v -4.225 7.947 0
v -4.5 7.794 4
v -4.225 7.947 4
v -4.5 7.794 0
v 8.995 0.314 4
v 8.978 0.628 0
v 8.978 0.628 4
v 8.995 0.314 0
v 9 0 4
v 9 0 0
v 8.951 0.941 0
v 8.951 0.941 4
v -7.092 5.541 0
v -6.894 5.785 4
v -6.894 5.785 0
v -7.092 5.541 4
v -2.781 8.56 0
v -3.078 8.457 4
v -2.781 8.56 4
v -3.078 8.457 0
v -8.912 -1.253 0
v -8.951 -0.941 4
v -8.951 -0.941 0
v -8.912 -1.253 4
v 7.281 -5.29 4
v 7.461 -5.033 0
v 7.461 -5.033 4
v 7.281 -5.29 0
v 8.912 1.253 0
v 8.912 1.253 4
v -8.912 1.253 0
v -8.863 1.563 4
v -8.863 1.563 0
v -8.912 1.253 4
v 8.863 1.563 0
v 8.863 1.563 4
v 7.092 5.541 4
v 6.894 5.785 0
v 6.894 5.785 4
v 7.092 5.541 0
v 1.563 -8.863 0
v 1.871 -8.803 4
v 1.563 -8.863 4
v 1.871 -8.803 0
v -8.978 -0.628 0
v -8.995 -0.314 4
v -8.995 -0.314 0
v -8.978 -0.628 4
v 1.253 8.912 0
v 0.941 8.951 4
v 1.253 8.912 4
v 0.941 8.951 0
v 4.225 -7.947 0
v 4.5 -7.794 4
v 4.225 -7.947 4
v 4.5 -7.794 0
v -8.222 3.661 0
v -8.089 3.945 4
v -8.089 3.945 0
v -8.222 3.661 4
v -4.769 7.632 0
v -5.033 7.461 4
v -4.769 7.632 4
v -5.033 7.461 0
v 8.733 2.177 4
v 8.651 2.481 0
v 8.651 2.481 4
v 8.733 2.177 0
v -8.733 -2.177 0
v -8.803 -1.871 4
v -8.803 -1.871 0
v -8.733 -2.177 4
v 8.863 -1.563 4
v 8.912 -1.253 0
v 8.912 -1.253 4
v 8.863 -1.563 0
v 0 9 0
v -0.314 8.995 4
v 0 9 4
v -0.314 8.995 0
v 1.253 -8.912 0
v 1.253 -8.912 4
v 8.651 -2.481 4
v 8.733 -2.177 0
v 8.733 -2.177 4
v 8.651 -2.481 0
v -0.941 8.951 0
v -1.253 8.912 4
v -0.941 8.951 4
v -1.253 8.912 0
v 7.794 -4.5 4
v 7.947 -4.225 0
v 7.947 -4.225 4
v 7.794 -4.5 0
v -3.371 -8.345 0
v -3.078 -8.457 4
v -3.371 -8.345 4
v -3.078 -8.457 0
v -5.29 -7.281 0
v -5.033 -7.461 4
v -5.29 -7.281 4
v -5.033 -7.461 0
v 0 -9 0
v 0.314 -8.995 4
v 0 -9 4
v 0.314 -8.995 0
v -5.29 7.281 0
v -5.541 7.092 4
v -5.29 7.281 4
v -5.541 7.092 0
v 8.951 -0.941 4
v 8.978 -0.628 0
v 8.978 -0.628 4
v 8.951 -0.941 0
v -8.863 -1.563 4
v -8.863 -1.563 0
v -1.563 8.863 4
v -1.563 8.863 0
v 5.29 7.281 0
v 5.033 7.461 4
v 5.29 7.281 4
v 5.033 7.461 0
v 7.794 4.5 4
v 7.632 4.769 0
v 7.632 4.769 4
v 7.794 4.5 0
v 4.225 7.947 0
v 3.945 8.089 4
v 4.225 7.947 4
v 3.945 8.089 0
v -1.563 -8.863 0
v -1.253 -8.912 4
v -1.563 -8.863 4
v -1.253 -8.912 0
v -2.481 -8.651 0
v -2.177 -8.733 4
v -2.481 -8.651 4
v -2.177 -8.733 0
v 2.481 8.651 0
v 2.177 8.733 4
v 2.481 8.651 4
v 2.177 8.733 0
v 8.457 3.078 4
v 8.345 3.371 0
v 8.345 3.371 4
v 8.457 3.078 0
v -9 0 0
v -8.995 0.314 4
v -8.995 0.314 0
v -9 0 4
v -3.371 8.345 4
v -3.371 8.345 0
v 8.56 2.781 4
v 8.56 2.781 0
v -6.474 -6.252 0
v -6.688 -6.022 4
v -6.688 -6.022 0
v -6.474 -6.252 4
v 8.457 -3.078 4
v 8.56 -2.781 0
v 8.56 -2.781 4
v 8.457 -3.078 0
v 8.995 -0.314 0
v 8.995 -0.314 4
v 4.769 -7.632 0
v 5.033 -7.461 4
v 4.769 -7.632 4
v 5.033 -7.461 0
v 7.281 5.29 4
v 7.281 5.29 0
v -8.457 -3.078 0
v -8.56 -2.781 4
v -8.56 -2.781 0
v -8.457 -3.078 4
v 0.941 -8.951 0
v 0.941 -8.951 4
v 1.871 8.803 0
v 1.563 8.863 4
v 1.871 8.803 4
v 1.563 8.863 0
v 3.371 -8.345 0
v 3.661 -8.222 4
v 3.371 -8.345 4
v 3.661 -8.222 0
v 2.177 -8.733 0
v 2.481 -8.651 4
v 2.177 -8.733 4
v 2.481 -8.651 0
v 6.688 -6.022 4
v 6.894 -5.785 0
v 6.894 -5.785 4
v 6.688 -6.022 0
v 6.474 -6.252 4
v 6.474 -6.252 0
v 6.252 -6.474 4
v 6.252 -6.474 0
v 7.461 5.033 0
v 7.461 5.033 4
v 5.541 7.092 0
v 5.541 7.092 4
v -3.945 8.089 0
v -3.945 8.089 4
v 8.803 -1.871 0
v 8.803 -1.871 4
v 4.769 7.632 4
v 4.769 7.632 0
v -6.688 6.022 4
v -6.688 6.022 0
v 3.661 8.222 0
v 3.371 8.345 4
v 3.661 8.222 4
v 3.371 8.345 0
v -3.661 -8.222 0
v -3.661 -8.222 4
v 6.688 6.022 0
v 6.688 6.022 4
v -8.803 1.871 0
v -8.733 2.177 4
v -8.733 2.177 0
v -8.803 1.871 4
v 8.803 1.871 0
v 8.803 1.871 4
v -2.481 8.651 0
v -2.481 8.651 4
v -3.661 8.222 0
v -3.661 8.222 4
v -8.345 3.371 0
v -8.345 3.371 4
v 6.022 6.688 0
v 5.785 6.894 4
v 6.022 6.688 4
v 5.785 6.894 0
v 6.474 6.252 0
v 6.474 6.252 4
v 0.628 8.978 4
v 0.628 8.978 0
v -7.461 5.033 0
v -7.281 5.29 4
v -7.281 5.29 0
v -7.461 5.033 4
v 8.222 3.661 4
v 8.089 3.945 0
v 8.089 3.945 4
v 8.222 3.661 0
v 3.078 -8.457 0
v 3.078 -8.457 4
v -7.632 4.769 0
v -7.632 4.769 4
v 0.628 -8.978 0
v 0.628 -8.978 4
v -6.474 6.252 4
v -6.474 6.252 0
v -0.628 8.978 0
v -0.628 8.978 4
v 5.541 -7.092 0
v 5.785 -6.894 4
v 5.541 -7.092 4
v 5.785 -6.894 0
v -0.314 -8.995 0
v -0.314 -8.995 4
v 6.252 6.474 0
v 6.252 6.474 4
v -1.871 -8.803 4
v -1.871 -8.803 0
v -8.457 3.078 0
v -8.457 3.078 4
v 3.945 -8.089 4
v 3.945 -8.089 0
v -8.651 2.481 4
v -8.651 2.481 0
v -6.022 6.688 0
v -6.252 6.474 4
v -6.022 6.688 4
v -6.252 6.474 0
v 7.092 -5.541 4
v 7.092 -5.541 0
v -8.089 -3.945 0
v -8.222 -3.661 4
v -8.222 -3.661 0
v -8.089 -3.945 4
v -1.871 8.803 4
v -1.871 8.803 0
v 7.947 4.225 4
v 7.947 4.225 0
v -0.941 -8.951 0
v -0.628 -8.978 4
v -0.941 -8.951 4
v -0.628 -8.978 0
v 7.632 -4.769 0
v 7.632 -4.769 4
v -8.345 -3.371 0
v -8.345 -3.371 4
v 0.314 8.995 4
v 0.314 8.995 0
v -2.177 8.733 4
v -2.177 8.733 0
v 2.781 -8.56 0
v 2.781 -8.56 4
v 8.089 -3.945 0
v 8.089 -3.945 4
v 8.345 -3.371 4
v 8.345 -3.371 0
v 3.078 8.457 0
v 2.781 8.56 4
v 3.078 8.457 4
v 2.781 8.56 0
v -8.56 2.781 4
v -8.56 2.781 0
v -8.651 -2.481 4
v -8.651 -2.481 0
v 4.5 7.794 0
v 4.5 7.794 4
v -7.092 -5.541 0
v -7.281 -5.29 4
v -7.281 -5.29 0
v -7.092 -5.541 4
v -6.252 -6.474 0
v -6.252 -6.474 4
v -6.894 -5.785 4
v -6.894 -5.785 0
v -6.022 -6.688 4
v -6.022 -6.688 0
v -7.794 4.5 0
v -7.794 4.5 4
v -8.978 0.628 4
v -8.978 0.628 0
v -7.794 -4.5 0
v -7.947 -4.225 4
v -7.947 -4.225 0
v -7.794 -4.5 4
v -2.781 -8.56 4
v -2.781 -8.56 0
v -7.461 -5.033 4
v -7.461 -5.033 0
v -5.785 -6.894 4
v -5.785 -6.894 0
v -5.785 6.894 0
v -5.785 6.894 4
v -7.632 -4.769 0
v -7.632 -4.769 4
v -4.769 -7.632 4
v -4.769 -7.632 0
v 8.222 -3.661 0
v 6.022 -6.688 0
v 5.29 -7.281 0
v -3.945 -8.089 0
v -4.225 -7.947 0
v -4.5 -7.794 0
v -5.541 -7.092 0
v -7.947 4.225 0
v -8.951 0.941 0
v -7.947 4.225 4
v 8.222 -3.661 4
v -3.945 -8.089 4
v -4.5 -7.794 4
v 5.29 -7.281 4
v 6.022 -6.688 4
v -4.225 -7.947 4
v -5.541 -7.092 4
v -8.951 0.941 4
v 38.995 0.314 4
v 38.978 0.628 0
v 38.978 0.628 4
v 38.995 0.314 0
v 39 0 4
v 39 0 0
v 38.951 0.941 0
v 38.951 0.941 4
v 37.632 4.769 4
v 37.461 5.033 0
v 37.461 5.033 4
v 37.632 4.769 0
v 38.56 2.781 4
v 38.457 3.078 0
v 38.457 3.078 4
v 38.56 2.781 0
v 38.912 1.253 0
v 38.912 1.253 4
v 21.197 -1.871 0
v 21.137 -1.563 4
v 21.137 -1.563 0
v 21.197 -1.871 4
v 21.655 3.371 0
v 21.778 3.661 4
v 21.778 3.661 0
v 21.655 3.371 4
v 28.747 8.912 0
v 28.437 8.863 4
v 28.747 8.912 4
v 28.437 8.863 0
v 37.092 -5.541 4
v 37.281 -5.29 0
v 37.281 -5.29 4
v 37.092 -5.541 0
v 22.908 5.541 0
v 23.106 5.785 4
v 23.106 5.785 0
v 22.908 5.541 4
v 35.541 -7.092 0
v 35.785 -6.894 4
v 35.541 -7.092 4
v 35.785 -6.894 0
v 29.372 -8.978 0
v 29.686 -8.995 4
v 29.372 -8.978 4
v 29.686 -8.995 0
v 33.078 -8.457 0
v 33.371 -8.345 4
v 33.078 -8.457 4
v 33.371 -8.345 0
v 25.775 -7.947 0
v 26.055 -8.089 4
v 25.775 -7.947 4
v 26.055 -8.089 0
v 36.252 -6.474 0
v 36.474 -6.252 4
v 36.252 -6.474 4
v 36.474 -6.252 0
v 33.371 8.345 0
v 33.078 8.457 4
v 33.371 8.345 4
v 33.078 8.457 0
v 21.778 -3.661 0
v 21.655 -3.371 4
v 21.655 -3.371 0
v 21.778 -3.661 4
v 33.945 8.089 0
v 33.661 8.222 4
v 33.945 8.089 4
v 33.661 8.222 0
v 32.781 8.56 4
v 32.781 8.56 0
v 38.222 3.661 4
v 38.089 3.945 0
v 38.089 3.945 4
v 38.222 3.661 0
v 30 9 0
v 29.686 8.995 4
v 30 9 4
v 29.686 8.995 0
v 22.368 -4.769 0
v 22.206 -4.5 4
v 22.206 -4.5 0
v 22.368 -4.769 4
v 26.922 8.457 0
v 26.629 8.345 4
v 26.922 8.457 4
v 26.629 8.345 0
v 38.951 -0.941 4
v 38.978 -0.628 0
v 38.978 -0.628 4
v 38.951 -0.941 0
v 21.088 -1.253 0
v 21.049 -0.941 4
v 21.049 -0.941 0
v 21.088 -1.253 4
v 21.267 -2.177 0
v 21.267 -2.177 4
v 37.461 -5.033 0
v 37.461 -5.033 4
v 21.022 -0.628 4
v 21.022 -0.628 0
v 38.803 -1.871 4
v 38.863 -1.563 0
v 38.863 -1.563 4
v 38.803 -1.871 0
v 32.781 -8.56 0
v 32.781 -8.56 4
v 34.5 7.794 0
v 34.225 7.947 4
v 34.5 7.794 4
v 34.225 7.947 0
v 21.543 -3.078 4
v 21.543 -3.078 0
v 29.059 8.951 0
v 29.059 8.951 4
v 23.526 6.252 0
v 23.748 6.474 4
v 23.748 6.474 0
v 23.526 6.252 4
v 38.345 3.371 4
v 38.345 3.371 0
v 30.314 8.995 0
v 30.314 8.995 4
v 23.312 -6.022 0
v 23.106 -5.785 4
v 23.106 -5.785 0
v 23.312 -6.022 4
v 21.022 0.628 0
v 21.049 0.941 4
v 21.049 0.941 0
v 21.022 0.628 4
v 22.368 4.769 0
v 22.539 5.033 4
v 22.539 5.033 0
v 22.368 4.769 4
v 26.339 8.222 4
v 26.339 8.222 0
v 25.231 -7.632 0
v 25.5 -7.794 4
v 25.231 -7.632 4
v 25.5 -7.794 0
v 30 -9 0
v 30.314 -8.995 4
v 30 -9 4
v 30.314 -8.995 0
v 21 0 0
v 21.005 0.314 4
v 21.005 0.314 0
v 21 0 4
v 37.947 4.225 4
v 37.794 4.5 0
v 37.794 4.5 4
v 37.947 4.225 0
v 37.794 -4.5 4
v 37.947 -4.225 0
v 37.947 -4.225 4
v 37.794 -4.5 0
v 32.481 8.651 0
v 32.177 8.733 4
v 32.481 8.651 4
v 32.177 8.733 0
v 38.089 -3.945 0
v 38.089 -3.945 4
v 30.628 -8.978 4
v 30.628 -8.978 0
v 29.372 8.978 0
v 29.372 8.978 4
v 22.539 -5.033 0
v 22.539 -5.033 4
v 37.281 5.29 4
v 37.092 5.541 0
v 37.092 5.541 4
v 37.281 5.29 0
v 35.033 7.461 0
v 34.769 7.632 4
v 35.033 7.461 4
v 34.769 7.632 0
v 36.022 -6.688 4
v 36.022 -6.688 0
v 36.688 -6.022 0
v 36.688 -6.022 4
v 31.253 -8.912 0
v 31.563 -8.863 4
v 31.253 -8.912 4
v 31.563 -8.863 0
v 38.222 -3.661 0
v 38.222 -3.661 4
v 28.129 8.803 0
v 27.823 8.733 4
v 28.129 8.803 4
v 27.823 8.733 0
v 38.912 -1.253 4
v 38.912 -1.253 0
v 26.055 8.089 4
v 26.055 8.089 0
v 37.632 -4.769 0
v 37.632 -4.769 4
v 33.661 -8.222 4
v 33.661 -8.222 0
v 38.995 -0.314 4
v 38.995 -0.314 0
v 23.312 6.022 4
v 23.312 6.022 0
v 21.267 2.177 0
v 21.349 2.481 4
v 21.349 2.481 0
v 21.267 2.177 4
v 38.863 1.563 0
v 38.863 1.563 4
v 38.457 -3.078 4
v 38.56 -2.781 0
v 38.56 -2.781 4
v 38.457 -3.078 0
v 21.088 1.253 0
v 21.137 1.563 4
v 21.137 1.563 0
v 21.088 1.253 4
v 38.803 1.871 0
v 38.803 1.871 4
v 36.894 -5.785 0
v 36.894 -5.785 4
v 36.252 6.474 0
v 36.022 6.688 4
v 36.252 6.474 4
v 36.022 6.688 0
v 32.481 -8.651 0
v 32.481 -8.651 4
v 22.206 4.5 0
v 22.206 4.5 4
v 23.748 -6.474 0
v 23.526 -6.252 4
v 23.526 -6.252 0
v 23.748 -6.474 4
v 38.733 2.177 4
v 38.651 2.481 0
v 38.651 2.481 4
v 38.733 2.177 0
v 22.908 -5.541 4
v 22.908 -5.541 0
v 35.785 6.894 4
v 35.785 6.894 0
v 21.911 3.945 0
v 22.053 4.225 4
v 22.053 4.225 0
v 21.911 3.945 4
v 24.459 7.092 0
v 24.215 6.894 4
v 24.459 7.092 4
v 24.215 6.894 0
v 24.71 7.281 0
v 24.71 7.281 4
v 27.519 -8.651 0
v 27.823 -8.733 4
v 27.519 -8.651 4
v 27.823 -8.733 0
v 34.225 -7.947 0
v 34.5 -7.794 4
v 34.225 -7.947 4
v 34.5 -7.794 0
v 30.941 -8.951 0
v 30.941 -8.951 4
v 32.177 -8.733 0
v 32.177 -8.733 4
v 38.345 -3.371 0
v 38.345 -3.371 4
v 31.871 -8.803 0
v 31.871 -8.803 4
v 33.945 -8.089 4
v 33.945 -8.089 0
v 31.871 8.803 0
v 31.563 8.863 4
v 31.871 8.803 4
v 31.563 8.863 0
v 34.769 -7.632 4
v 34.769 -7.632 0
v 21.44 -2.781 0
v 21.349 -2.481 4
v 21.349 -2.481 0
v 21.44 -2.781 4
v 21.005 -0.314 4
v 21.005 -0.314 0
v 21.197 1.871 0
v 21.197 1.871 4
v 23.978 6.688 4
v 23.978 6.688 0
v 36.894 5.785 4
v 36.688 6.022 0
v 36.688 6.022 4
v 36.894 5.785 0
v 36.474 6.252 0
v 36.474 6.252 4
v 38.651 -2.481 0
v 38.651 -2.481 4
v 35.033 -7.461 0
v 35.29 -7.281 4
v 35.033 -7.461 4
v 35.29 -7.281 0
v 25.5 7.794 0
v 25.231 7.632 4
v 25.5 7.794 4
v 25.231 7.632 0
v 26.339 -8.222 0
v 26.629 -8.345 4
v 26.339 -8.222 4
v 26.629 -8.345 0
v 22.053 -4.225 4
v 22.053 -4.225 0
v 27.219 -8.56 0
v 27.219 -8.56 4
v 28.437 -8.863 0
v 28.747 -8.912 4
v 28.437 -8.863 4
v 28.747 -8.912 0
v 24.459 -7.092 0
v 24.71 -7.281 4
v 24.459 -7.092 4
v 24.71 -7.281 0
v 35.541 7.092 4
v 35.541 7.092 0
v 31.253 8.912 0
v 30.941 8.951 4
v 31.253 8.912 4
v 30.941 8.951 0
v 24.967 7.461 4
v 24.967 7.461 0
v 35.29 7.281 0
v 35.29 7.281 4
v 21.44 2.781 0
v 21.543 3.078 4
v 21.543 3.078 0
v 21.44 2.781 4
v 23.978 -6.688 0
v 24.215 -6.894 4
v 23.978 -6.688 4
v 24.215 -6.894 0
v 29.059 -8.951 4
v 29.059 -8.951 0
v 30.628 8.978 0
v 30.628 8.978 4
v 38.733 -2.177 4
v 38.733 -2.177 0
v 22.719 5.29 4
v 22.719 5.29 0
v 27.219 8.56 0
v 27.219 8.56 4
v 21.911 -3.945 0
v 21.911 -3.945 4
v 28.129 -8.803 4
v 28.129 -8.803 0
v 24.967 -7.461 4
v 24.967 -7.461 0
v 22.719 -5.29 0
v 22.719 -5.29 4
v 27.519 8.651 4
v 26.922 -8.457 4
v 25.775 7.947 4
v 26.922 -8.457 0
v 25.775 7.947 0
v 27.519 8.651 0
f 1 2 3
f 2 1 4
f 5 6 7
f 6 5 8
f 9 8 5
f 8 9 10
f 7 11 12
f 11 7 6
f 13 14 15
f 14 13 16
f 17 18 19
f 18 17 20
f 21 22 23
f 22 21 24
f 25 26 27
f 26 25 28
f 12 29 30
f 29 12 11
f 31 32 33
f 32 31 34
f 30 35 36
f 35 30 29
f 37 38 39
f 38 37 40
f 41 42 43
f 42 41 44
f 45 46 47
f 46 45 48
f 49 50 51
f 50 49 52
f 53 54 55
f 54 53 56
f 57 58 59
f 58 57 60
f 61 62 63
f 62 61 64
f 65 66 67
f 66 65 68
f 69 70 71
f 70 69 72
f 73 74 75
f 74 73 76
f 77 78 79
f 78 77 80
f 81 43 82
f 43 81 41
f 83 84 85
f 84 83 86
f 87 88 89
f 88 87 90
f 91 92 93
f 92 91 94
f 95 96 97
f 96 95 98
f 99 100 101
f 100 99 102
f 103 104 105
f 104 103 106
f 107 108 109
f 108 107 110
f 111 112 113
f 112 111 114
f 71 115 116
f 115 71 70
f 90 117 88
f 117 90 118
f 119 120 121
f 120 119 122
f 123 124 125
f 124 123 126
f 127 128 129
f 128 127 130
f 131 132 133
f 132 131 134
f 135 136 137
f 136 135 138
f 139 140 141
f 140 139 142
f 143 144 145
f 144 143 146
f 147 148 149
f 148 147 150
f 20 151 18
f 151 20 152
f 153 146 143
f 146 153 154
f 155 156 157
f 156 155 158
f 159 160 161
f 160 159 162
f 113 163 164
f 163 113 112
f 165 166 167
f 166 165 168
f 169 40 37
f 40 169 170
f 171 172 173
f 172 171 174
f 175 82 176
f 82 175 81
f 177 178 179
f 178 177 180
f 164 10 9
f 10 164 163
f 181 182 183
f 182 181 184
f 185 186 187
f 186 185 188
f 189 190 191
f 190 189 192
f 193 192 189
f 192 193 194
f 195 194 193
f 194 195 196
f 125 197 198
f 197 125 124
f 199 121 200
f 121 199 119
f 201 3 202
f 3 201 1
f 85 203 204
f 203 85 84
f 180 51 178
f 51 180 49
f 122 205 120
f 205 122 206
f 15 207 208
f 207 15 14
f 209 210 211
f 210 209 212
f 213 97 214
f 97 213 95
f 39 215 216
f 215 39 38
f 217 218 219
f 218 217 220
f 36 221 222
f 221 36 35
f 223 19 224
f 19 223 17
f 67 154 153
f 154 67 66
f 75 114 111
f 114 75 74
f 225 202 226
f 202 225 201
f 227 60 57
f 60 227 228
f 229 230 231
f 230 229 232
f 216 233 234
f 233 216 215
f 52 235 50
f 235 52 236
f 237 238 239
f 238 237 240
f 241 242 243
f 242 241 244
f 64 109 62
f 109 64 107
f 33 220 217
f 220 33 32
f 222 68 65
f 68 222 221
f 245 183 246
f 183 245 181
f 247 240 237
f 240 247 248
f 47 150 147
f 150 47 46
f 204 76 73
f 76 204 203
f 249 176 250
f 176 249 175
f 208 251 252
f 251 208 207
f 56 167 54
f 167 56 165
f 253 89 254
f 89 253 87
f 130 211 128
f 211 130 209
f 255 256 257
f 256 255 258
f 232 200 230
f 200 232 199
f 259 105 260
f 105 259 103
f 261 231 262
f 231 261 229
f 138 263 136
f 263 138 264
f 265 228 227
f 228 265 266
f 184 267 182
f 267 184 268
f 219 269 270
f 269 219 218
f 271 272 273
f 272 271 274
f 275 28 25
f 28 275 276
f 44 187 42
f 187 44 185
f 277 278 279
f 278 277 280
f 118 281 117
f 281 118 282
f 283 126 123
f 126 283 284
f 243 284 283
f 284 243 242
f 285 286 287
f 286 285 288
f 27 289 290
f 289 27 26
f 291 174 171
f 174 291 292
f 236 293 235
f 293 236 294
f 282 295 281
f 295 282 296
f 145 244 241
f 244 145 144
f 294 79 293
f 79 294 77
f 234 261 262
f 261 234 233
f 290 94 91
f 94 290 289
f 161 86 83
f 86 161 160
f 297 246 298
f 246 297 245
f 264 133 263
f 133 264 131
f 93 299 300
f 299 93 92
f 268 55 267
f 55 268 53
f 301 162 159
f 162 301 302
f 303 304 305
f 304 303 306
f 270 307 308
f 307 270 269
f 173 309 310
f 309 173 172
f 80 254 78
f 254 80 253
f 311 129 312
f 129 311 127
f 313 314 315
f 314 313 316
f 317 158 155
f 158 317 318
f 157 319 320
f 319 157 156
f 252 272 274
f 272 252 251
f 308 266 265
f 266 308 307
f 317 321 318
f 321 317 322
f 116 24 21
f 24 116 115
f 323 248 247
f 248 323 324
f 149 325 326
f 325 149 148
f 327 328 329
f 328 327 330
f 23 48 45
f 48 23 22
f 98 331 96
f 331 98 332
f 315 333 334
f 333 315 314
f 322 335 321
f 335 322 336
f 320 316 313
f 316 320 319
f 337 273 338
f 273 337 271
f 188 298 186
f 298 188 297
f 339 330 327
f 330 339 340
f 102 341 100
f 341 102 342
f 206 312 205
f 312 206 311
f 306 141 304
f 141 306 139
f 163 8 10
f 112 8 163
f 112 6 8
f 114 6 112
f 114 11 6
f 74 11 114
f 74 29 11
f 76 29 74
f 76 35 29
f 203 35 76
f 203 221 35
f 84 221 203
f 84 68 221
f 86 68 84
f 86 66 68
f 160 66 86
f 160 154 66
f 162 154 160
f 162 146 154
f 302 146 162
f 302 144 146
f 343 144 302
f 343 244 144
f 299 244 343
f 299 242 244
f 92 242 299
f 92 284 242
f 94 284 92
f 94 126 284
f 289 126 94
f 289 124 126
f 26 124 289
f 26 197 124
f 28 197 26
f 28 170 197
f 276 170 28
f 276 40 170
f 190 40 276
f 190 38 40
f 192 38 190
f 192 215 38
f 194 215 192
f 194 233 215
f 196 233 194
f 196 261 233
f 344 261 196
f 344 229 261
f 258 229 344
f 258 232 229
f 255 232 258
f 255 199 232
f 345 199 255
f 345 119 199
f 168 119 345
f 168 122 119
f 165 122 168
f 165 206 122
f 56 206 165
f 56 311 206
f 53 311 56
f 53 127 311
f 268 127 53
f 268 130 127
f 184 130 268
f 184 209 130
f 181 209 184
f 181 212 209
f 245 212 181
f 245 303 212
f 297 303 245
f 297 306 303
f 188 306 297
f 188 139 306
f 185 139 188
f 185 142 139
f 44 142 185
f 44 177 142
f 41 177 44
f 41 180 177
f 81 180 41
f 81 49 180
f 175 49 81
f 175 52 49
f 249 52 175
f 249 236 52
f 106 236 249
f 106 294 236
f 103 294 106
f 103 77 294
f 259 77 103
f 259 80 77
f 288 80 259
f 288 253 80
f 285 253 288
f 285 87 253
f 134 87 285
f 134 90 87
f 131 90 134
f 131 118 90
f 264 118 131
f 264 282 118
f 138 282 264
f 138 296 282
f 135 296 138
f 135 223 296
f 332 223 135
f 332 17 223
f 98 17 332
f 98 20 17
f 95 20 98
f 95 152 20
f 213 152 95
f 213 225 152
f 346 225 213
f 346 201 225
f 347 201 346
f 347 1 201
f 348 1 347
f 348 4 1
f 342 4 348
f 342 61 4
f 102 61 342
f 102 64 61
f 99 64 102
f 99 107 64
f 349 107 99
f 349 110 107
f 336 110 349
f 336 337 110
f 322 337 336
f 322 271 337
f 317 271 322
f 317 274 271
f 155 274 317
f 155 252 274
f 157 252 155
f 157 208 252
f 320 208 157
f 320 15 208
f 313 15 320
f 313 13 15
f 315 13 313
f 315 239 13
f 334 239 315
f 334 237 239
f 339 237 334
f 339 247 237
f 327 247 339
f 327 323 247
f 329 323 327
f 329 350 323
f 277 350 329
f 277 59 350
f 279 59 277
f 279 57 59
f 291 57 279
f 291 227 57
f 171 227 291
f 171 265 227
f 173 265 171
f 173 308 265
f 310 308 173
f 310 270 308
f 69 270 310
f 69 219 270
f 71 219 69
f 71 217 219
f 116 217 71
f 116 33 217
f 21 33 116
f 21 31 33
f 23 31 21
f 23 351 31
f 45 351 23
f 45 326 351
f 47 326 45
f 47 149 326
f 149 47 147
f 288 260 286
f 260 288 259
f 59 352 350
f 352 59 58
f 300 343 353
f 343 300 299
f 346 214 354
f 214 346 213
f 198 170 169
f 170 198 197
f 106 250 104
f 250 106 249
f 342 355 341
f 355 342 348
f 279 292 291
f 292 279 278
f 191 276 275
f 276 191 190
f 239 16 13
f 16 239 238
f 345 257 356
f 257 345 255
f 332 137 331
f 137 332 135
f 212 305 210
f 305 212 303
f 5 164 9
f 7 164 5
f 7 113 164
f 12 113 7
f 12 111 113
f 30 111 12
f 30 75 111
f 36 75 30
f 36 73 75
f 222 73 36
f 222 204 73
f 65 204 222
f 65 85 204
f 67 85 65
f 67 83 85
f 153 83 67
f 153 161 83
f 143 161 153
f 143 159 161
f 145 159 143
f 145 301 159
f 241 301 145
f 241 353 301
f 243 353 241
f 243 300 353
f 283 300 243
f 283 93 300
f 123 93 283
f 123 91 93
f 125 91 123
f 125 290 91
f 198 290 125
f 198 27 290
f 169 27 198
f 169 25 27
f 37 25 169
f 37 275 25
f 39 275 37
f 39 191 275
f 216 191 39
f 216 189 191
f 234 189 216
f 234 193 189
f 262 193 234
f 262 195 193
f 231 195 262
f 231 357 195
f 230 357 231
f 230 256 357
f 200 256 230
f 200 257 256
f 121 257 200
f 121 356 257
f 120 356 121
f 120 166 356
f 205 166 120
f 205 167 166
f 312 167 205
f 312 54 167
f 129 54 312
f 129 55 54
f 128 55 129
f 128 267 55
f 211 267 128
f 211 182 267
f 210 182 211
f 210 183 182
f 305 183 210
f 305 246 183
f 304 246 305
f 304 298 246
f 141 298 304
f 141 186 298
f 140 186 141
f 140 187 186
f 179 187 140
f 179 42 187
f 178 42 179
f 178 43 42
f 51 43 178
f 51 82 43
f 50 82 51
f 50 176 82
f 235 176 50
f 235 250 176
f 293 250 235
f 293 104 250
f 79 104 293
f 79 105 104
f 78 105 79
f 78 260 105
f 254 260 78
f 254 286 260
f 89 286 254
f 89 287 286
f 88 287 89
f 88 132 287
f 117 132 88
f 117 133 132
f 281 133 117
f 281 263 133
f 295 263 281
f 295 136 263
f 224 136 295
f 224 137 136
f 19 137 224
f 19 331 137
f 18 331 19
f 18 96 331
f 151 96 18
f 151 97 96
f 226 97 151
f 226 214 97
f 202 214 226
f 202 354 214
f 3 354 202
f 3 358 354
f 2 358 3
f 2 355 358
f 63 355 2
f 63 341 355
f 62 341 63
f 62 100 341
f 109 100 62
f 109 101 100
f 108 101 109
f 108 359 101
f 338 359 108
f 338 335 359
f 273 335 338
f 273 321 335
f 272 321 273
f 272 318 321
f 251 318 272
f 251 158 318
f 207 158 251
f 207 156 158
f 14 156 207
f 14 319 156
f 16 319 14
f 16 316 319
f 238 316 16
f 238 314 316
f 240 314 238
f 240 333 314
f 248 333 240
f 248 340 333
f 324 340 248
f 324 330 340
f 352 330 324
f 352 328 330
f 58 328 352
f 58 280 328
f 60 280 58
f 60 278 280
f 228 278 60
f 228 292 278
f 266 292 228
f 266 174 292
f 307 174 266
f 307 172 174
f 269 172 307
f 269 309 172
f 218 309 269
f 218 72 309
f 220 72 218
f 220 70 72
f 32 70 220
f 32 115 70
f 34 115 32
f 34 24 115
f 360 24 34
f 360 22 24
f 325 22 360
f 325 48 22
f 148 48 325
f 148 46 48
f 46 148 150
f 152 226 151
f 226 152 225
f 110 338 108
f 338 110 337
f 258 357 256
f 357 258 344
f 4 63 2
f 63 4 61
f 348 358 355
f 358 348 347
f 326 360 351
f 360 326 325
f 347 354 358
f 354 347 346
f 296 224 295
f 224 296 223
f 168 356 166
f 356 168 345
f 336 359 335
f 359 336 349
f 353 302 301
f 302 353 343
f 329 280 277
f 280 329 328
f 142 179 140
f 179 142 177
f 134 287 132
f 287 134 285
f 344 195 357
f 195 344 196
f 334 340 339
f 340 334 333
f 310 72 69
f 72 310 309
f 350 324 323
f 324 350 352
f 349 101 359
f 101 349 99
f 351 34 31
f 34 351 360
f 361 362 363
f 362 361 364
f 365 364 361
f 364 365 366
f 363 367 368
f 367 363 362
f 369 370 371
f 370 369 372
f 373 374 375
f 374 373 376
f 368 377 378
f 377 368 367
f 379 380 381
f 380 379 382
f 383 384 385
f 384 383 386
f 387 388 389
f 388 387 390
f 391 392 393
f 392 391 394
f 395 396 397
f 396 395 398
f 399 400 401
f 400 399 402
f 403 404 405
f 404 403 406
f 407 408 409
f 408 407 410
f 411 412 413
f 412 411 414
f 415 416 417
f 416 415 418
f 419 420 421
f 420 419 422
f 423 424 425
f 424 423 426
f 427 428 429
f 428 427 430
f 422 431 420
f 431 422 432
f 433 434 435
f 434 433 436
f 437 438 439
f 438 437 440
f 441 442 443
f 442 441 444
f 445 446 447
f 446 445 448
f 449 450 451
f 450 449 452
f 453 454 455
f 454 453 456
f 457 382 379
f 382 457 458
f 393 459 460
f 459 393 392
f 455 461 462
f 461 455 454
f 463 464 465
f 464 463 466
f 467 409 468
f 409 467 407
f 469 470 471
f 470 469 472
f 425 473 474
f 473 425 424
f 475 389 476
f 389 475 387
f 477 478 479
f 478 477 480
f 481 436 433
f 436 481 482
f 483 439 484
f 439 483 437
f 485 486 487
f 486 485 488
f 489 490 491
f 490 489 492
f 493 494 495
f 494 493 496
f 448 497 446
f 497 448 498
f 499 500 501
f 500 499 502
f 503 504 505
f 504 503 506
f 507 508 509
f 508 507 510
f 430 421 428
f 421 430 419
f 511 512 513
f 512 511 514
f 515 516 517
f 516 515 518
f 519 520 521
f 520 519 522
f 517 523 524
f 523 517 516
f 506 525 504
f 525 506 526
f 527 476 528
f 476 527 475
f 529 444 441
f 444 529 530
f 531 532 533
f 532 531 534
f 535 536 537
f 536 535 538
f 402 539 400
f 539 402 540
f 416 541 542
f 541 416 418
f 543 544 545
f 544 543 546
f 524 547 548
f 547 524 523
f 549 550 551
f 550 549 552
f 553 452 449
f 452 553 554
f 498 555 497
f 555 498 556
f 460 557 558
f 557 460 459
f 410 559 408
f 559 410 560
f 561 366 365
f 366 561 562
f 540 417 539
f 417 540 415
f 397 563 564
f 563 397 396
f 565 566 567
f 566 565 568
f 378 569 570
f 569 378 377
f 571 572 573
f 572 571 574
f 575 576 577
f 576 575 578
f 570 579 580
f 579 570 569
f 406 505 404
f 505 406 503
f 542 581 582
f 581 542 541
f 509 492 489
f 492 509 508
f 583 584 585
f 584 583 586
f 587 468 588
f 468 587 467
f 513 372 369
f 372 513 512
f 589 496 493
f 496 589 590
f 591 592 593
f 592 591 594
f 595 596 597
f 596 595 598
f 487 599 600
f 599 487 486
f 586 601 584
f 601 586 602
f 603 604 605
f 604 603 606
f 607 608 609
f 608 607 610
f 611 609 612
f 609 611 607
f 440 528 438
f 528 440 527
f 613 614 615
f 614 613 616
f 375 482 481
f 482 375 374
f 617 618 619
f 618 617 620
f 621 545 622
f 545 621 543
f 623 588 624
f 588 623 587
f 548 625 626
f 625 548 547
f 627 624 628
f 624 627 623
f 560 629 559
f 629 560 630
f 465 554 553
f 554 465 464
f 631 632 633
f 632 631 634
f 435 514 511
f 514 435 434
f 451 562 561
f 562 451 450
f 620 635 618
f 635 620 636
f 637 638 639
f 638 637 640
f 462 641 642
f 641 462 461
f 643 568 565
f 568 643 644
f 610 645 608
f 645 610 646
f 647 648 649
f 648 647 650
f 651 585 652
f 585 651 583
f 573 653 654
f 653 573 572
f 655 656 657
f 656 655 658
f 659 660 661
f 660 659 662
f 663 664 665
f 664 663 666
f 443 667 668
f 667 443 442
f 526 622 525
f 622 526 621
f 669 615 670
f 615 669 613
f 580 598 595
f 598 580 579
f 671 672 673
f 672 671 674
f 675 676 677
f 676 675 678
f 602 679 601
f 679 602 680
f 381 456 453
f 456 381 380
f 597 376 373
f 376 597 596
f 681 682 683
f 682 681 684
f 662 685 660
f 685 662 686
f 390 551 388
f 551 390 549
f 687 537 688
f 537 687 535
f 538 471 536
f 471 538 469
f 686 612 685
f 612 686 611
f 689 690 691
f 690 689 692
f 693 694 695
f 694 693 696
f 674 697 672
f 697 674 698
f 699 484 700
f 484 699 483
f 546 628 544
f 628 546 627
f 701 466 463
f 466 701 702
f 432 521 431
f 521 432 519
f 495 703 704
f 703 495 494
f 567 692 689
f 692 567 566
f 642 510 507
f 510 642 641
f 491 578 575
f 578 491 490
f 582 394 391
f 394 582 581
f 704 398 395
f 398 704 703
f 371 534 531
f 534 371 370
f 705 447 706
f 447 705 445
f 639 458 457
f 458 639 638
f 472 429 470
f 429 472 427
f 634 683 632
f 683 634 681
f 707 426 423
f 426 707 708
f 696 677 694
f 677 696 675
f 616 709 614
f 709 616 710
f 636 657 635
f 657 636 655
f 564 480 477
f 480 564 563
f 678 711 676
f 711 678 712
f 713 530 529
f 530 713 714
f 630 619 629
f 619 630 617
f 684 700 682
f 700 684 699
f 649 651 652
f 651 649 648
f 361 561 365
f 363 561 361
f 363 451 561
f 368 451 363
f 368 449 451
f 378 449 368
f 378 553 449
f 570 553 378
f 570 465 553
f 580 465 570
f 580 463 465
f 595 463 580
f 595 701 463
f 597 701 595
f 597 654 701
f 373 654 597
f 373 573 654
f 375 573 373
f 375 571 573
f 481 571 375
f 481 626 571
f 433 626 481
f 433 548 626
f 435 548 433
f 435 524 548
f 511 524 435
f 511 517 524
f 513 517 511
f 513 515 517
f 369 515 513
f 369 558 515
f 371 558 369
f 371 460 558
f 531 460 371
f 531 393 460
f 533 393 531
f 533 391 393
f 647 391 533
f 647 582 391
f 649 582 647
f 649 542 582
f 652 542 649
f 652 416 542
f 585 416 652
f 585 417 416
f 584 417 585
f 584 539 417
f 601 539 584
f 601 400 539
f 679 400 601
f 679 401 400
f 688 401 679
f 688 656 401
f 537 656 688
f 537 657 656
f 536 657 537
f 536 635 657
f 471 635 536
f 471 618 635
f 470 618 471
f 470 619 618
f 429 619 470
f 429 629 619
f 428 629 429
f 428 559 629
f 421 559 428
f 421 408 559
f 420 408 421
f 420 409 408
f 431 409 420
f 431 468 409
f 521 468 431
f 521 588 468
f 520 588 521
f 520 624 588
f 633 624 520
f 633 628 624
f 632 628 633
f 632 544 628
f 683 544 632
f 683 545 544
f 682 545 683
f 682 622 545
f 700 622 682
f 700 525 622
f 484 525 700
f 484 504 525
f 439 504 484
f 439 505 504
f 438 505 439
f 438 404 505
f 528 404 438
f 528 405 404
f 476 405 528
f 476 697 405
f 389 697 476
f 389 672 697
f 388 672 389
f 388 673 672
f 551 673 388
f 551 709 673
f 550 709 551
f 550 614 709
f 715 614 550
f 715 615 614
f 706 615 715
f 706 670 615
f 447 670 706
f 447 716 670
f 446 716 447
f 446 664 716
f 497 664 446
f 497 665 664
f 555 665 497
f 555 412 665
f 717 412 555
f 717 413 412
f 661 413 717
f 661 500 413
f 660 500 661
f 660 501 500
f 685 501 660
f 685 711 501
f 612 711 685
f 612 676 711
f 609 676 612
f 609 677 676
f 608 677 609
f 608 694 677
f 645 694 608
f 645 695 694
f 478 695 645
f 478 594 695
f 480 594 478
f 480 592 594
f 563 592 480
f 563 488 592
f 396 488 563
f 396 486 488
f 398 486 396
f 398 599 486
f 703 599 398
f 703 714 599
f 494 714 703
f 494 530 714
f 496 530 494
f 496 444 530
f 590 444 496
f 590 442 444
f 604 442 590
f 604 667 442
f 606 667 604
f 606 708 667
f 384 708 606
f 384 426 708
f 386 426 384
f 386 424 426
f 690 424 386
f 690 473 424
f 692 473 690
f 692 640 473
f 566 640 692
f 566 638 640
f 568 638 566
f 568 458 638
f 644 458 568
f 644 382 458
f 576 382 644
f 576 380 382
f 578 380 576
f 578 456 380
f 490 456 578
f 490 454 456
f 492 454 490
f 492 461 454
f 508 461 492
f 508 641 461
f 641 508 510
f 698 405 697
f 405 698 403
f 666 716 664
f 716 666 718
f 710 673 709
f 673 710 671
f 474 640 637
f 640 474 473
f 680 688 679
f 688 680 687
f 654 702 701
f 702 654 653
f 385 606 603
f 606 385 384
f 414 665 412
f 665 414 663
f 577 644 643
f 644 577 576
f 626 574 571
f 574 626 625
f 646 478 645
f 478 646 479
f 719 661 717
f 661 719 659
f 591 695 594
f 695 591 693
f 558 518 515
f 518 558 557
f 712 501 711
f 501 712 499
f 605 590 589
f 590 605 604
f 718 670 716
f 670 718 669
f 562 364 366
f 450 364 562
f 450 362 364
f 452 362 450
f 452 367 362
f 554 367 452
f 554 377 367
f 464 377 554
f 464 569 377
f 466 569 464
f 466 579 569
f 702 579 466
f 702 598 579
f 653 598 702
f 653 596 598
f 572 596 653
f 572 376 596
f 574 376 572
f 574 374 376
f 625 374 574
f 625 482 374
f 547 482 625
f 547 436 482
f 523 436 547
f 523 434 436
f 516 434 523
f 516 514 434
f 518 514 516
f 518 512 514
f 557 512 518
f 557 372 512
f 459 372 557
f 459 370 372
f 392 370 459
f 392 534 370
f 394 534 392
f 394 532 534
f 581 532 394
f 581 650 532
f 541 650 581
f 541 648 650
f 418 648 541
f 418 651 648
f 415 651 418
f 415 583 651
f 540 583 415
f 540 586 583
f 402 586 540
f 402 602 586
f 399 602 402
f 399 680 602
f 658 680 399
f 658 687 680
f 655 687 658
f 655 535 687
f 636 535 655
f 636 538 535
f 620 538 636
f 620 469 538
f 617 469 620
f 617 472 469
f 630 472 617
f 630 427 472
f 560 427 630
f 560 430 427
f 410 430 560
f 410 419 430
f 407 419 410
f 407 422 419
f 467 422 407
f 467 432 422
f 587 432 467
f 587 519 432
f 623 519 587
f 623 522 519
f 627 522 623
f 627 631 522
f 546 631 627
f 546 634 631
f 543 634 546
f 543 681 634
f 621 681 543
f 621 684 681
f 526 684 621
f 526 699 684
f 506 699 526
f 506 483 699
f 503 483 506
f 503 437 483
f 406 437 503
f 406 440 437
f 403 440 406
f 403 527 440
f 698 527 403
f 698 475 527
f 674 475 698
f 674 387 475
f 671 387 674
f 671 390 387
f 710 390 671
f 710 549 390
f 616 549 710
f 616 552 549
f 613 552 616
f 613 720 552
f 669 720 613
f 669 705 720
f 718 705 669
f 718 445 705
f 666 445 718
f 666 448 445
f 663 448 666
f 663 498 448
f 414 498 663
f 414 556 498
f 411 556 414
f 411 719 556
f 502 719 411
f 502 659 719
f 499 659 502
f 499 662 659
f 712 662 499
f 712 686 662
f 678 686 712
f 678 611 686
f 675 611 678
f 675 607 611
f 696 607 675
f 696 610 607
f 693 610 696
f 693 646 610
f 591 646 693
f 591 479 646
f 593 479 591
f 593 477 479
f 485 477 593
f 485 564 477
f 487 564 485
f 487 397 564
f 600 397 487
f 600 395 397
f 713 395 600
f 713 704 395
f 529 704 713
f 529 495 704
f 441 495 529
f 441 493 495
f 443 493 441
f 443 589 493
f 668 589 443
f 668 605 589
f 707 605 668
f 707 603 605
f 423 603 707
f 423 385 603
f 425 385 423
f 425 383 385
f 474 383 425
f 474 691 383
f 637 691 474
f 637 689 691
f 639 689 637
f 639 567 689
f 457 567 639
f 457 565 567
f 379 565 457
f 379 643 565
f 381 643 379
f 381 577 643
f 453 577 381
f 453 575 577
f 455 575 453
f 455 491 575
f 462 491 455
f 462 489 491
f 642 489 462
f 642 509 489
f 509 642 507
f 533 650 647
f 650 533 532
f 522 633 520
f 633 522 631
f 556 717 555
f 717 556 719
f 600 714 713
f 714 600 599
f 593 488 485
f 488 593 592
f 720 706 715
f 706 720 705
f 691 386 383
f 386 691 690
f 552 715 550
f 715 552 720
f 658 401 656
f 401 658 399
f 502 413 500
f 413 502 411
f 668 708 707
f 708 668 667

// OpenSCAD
// Same geometry shape as connectivity_disconnected_fail, but here the
// multi-shell result is DELIBERATE and declared -- the escape hatch that
// keeps the default-on check from being wrong for a legitimately
// multi-solid part (e.g. a printed-in-place hinge pin shipped in one STL).

$fa = 2; $fs = 0.3;

// EXPECTED_BODIES: 2

translate([0, 0, 0]) cylinder(r = 9, h = 4);
translate([30, 0, 0]) cylinder(r = 9, h = 4);
